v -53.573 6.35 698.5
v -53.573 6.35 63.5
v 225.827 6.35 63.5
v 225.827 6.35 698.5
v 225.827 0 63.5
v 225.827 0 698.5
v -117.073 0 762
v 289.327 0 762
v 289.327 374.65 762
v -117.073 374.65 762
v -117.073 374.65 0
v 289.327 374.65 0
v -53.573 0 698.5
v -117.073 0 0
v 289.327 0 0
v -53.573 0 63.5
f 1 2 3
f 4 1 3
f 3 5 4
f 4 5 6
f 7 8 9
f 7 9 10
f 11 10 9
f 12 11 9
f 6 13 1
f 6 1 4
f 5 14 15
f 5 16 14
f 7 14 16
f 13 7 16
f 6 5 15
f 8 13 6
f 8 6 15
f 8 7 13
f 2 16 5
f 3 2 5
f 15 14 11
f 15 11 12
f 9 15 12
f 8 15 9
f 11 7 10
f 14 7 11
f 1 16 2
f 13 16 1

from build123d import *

# Parameters (mm, degrees)
F0_W     = 279.4
F0_H     = 635
F1_DEPTH = 374.65
F2_DEPTH = 6.35


# Not quite as in the source:
# - a feature names something its author has since deleted; it is built from what else it names


with BuildPart() as f1:
    # F0 (on Front) → F1 (new body)
    with BuildSketch(Plane.XZ):
        Polygon((263.9267770052, 0), (289.3267770052, 0), (289.3267770052, 762), (263.9267770052, 762), (-117.0732229948, 762), (-117.0732229948, 0), align=None)
        with Locations((86.1267770052, 381)):
            Rectangle(F0_W, F0_H, mode=Mode.SUBTRACT)
        with Locations((86.1267770052, 381)):
            Rectangle(F0_W, F0_H)
    extrude(amount=-F1_DEPTH)

    # F0 (on Front) → F2 (cut)
    with BuildSketch(Plane.XZ):
        with Locations((86.1267770052, 381)):
            Rectangle(F0_W, F0_H)
    extrude(amount=-F2_DEPTH, mode=Mode.SUBTRACT)


solid = f1.part
